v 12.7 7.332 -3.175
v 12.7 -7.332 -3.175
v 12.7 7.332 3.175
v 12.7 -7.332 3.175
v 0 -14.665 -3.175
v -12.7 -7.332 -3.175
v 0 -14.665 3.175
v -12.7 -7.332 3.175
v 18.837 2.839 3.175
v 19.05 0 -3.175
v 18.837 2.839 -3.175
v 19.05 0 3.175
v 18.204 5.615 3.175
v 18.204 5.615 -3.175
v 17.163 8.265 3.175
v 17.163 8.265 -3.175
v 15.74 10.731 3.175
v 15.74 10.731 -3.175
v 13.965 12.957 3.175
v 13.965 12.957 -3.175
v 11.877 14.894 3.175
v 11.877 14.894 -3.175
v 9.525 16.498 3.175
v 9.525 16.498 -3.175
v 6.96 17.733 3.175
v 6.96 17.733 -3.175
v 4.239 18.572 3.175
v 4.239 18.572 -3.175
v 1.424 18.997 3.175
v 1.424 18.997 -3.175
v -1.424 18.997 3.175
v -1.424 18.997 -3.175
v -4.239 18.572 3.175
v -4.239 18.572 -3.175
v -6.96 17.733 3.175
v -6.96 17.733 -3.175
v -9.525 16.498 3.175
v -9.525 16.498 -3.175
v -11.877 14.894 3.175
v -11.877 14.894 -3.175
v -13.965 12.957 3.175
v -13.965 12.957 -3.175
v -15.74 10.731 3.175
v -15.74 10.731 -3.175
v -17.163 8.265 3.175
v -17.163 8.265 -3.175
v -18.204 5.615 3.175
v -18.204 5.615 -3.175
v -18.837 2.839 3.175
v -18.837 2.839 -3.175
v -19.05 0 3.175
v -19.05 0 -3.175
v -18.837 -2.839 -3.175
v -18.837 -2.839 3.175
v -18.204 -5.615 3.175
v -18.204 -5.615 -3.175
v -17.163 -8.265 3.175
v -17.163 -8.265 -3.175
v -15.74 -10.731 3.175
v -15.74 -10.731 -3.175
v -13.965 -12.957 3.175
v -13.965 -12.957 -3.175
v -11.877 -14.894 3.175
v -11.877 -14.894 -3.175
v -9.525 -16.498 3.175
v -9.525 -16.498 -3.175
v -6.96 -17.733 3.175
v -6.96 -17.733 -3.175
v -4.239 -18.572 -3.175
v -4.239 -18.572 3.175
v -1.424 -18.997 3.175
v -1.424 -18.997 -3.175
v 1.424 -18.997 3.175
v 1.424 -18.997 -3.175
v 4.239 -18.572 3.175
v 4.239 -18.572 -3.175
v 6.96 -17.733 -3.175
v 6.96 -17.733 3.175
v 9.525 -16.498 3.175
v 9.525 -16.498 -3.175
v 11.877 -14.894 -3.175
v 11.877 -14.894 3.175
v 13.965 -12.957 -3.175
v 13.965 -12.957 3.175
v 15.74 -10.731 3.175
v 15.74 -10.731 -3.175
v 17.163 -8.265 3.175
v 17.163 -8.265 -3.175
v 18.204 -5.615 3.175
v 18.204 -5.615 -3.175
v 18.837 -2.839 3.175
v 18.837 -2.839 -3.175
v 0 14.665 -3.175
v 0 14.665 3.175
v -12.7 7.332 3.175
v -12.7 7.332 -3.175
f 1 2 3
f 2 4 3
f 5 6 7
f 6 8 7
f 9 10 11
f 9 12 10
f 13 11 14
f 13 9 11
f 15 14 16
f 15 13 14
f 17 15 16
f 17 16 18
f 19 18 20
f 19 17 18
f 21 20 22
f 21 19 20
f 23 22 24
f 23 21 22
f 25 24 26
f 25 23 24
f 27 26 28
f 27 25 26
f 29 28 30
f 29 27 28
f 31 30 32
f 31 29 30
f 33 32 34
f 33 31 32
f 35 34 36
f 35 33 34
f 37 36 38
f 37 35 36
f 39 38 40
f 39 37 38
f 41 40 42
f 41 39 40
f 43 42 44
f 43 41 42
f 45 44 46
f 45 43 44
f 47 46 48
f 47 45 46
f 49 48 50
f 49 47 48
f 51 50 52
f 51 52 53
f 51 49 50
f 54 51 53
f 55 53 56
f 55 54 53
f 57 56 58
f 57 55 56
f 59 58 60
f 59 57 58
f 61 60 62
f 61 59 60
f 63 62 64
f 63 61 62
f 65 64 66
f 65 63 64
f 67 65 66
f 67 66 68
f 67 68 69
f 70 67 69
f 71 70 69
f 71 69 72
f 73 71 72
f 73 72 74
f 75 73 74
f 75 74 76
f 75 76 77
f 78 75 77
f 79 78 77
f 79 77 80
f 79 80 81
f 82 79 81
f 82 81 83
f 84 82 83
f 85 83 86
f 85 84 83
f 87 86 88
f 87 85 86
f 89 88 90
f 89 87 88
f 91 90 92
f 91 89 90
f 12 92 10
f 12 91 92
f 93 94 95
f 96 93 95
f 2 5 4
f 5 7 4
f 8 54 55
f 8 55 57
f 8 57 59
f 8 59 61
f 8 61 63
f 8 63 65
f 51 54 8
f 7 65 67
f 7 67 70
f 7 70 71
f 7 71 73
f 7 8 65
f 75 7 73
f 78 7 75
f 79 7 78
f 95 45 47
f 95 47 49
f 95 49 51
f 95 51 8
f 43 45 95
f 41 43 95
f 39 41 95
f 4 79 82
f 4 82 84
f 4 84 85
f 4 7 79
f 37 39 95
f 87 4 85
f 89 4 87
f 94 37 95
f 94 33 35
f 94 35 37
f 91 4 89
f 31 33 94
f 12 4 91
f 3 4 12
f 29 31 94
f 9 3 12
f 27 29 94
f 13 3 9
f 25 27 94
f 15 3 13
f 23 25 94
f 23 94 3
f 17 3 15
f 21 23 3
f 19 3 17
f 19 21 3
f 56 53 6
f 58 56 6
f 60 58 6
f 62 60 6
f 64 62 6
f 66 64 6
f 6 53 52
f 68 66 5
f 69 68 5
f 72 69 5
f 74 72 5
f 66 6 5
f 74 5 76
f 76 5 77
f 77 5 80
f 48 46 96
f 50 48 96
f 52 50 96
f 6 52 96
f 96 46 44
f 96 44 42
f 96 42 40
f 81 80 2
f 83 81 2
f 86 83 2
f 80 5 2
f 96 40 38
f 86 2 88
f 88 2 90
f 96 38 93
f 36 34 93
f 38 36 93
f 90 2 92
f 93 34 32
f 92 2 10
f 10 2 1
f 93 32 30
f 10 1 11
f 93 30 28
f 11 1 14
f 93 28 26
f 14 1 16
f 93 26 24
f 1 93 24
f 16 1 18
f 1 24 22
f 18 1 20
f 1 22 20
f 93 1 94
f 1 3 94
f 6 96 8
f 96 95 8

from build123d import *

# Parameters (mm, degrees)
SKETCH1_R           = 19.05
BOSS_EXTRUDE1_DEPTH = 3.175


with BuildPart() as part:
    # Sketch1 → Boss-Extrude1 (new body, symmetric)
    with BuildSketch(Plane.XY):
        Circle(SKETCH1_R)
        Polygon((0, 14.664696837), (-12.7, 7.332348419), (-12.7, -7.332348419), (0, -14.664696837), (12.7, -7.332348419), (12.7, 7.332348419), align=None, mode=Mode.SUBTRACT)
    extrude(amount=BOSS_EXTRUDE1_DEPTH, both=True)


solid = part.part
